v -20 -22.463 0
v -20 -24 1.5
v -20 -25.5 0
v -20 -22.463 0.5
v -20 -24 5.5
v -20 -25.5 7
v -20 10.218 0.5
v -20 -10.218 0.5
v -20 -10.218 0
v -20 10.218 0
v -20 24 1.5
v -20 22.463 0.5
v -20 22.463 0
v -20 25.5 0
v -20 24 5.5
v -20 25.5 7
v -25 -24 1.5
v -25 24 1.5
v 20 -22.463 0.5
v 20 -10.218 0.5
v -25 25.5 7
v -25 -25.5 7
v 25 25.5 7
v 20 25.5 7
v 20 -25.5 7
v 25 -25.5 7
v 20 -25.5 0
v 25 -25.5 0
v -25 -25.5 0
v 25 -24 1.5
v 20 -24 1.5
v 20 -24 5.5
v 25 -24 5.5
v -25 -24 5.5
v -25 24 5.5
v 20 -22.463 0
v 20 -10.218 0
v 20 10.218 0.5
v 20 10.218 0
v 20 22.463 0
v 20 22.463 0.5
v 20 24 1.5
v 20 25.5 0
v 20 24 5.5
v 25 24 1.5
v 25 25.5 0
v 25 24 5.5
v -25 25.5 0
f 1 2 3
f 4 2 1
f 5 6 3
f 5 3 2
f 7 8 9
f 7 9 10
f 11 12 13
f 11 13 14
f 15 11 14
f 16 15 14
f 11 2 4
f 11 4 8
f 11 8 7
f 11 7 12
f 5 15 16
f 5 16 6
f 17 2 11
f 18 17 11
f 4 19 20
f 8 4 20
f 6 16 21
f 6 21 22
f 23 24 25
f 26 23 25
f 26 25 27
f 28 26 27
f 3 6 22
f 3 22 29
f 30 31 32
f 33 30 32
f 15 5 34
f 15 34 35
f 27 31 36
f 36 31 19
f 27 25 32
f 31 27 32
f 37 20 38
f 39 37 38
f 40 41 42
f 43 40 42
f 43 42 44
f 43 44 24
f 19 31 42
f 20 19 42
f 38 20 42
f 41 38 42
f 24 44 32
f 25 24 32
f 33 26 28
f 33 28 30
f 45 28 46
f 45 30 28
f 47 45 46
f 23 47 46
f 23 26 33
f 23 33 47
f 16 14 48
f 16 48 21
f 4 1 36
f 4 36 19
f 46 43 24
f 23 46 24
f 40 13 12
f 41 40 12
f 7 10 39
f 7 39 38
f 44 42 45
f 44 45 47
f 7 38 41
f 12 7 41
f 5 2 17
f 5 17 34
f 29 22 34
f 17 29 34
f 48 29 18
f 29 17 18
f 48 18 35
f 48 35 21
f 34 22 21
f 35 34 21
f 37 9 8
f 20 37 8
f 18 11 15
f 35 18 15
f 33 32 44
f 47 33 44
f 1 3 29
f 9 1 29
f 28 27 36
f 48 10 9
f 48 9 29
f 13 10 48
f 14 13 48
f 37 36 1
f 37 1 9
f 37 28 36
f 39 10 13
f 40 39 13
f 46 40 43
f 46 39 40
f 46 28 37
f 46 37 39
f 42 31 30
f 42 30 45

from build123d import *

# Parameters (mm, degrees)
F1_START      = 20
F0_W          = 48
F0_H          = 4
F0_W_2        = 12.2445234573
F0_H_2        = 0.5
F1_DEPTH      = 5
F2_START      = -20
F2_DEPTH      = 5
F3_DEPTH      = 25
F3_DEPTH_BACK = 25


with BuildPart() as f1:
    # F0 (on Right) → F1 (new body)
    with BuildSketch(Plane.YZ.offset(F1_START)):
        Polygon((-25.5, 7), (-25.5, 0), (-22.4627573043, 0), (-22.4627573043, 0.5), (-10.218233847, 0.5), (-10.218233847, 0), (10.218233847, 0), (10.218233847, 0.5), (22.4627573043, 0.5), (22.4627573043, 0), (25.5, 0), (25.5, 7), align=None)
        with Locations((0, 3.5)):
            Rectangle(F0_W, F0_H, mode=Mode.SUBTRACT)
        with Locations((-16.3404955757, 0.25)):
            Rectangle(F0_W_2, F0_H_2)
        with Locations((16.3404955757, 0.25)):
            Rectangle(F0_W_2, F0_H_2)
    extrude(amount=F1_DEPTH)



with BuildPart() as f2:
    # F0 (on Right) → F2 (new body)
    with BuildSketch(Plane.YZ.offset(F2_START)):
        Polygon((-25.5, 7), (-25.5, 0), (-22.4627573043, 0), (-22.4627573043, 0.5), (-10.218233847, 0.5), (-10.218233847, 0), (10.218233847, 0), (10.218233847, 0.5), (22.4627573043, 0.5), (22.4627573043, 0), (25.5, 0), (25.5, 7), align=None)
        with Locations((0, 3.5)):
            Rectangle(F0_W, F0_H, mode=Mode.SUBTRACT)
        with Locations((-16.3404955757, 0.25)):
            Rectangle(F0_W_2, F0_H_2)
        with Locations((16.3404955757, 0.25)):
            Rectangle(F0_W_2, F0_H_2)
    extrude(amount=-F2_DEPTH)


with BuildPart() as f1_1:
    add(f1.part)

    add(f2.part)  # F3 merges F2
    # F0 (on Right) → F3 (join, two sides)
    with BuildSketch(Plane.YZ) as f3_sk:
        with Locations((16.3404955757, 0.25)):
            Rectangle(F0_W_2, F0_H_2)
        with Locations((-16.3404955757, 0.25)):
            Rectangle(F0_W_2, F0_H_2)
    extrude(amount=F3_DEPTH)
    extrude(f3_sk.sketch, amount=-F3_DEPTH_BACK)


solid = f1_1.part
